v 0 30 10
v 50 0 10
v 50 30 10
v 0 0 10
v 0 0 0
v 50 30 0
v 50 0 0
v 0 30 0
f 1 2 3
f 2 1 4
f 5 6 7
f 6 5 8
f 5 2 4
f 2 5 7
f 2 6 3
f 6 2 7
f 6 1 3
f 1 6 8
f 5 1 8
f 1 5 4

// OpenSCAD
// Advanced Parameters - Test Fixture
// Tests various parameter types and annotations

/*[Basic Dimensions]*/
width = 50;       // [10:100] Width in mm
height = 30;      // [10:80] Height in mm
angle = 45;       // [0:90] Rotation angle (degrees)

/*[Options]*/
shape = "round";  // [round, square, hexagon]
color_choice = "blue"; // [red, green, blue, yellow]
enable_feature = "yes"; // [yes, no]

/*[Advanced]*/
resolution = 3;   // [1:5] Detail level
tolerance = 0.2;  // [0.1:0.1:1.0] Fitting tolerance (mm)

/*[Hidden]*/
$fn = resolution * 16;
internal_var = 42;

cube([width, height, 10]);
